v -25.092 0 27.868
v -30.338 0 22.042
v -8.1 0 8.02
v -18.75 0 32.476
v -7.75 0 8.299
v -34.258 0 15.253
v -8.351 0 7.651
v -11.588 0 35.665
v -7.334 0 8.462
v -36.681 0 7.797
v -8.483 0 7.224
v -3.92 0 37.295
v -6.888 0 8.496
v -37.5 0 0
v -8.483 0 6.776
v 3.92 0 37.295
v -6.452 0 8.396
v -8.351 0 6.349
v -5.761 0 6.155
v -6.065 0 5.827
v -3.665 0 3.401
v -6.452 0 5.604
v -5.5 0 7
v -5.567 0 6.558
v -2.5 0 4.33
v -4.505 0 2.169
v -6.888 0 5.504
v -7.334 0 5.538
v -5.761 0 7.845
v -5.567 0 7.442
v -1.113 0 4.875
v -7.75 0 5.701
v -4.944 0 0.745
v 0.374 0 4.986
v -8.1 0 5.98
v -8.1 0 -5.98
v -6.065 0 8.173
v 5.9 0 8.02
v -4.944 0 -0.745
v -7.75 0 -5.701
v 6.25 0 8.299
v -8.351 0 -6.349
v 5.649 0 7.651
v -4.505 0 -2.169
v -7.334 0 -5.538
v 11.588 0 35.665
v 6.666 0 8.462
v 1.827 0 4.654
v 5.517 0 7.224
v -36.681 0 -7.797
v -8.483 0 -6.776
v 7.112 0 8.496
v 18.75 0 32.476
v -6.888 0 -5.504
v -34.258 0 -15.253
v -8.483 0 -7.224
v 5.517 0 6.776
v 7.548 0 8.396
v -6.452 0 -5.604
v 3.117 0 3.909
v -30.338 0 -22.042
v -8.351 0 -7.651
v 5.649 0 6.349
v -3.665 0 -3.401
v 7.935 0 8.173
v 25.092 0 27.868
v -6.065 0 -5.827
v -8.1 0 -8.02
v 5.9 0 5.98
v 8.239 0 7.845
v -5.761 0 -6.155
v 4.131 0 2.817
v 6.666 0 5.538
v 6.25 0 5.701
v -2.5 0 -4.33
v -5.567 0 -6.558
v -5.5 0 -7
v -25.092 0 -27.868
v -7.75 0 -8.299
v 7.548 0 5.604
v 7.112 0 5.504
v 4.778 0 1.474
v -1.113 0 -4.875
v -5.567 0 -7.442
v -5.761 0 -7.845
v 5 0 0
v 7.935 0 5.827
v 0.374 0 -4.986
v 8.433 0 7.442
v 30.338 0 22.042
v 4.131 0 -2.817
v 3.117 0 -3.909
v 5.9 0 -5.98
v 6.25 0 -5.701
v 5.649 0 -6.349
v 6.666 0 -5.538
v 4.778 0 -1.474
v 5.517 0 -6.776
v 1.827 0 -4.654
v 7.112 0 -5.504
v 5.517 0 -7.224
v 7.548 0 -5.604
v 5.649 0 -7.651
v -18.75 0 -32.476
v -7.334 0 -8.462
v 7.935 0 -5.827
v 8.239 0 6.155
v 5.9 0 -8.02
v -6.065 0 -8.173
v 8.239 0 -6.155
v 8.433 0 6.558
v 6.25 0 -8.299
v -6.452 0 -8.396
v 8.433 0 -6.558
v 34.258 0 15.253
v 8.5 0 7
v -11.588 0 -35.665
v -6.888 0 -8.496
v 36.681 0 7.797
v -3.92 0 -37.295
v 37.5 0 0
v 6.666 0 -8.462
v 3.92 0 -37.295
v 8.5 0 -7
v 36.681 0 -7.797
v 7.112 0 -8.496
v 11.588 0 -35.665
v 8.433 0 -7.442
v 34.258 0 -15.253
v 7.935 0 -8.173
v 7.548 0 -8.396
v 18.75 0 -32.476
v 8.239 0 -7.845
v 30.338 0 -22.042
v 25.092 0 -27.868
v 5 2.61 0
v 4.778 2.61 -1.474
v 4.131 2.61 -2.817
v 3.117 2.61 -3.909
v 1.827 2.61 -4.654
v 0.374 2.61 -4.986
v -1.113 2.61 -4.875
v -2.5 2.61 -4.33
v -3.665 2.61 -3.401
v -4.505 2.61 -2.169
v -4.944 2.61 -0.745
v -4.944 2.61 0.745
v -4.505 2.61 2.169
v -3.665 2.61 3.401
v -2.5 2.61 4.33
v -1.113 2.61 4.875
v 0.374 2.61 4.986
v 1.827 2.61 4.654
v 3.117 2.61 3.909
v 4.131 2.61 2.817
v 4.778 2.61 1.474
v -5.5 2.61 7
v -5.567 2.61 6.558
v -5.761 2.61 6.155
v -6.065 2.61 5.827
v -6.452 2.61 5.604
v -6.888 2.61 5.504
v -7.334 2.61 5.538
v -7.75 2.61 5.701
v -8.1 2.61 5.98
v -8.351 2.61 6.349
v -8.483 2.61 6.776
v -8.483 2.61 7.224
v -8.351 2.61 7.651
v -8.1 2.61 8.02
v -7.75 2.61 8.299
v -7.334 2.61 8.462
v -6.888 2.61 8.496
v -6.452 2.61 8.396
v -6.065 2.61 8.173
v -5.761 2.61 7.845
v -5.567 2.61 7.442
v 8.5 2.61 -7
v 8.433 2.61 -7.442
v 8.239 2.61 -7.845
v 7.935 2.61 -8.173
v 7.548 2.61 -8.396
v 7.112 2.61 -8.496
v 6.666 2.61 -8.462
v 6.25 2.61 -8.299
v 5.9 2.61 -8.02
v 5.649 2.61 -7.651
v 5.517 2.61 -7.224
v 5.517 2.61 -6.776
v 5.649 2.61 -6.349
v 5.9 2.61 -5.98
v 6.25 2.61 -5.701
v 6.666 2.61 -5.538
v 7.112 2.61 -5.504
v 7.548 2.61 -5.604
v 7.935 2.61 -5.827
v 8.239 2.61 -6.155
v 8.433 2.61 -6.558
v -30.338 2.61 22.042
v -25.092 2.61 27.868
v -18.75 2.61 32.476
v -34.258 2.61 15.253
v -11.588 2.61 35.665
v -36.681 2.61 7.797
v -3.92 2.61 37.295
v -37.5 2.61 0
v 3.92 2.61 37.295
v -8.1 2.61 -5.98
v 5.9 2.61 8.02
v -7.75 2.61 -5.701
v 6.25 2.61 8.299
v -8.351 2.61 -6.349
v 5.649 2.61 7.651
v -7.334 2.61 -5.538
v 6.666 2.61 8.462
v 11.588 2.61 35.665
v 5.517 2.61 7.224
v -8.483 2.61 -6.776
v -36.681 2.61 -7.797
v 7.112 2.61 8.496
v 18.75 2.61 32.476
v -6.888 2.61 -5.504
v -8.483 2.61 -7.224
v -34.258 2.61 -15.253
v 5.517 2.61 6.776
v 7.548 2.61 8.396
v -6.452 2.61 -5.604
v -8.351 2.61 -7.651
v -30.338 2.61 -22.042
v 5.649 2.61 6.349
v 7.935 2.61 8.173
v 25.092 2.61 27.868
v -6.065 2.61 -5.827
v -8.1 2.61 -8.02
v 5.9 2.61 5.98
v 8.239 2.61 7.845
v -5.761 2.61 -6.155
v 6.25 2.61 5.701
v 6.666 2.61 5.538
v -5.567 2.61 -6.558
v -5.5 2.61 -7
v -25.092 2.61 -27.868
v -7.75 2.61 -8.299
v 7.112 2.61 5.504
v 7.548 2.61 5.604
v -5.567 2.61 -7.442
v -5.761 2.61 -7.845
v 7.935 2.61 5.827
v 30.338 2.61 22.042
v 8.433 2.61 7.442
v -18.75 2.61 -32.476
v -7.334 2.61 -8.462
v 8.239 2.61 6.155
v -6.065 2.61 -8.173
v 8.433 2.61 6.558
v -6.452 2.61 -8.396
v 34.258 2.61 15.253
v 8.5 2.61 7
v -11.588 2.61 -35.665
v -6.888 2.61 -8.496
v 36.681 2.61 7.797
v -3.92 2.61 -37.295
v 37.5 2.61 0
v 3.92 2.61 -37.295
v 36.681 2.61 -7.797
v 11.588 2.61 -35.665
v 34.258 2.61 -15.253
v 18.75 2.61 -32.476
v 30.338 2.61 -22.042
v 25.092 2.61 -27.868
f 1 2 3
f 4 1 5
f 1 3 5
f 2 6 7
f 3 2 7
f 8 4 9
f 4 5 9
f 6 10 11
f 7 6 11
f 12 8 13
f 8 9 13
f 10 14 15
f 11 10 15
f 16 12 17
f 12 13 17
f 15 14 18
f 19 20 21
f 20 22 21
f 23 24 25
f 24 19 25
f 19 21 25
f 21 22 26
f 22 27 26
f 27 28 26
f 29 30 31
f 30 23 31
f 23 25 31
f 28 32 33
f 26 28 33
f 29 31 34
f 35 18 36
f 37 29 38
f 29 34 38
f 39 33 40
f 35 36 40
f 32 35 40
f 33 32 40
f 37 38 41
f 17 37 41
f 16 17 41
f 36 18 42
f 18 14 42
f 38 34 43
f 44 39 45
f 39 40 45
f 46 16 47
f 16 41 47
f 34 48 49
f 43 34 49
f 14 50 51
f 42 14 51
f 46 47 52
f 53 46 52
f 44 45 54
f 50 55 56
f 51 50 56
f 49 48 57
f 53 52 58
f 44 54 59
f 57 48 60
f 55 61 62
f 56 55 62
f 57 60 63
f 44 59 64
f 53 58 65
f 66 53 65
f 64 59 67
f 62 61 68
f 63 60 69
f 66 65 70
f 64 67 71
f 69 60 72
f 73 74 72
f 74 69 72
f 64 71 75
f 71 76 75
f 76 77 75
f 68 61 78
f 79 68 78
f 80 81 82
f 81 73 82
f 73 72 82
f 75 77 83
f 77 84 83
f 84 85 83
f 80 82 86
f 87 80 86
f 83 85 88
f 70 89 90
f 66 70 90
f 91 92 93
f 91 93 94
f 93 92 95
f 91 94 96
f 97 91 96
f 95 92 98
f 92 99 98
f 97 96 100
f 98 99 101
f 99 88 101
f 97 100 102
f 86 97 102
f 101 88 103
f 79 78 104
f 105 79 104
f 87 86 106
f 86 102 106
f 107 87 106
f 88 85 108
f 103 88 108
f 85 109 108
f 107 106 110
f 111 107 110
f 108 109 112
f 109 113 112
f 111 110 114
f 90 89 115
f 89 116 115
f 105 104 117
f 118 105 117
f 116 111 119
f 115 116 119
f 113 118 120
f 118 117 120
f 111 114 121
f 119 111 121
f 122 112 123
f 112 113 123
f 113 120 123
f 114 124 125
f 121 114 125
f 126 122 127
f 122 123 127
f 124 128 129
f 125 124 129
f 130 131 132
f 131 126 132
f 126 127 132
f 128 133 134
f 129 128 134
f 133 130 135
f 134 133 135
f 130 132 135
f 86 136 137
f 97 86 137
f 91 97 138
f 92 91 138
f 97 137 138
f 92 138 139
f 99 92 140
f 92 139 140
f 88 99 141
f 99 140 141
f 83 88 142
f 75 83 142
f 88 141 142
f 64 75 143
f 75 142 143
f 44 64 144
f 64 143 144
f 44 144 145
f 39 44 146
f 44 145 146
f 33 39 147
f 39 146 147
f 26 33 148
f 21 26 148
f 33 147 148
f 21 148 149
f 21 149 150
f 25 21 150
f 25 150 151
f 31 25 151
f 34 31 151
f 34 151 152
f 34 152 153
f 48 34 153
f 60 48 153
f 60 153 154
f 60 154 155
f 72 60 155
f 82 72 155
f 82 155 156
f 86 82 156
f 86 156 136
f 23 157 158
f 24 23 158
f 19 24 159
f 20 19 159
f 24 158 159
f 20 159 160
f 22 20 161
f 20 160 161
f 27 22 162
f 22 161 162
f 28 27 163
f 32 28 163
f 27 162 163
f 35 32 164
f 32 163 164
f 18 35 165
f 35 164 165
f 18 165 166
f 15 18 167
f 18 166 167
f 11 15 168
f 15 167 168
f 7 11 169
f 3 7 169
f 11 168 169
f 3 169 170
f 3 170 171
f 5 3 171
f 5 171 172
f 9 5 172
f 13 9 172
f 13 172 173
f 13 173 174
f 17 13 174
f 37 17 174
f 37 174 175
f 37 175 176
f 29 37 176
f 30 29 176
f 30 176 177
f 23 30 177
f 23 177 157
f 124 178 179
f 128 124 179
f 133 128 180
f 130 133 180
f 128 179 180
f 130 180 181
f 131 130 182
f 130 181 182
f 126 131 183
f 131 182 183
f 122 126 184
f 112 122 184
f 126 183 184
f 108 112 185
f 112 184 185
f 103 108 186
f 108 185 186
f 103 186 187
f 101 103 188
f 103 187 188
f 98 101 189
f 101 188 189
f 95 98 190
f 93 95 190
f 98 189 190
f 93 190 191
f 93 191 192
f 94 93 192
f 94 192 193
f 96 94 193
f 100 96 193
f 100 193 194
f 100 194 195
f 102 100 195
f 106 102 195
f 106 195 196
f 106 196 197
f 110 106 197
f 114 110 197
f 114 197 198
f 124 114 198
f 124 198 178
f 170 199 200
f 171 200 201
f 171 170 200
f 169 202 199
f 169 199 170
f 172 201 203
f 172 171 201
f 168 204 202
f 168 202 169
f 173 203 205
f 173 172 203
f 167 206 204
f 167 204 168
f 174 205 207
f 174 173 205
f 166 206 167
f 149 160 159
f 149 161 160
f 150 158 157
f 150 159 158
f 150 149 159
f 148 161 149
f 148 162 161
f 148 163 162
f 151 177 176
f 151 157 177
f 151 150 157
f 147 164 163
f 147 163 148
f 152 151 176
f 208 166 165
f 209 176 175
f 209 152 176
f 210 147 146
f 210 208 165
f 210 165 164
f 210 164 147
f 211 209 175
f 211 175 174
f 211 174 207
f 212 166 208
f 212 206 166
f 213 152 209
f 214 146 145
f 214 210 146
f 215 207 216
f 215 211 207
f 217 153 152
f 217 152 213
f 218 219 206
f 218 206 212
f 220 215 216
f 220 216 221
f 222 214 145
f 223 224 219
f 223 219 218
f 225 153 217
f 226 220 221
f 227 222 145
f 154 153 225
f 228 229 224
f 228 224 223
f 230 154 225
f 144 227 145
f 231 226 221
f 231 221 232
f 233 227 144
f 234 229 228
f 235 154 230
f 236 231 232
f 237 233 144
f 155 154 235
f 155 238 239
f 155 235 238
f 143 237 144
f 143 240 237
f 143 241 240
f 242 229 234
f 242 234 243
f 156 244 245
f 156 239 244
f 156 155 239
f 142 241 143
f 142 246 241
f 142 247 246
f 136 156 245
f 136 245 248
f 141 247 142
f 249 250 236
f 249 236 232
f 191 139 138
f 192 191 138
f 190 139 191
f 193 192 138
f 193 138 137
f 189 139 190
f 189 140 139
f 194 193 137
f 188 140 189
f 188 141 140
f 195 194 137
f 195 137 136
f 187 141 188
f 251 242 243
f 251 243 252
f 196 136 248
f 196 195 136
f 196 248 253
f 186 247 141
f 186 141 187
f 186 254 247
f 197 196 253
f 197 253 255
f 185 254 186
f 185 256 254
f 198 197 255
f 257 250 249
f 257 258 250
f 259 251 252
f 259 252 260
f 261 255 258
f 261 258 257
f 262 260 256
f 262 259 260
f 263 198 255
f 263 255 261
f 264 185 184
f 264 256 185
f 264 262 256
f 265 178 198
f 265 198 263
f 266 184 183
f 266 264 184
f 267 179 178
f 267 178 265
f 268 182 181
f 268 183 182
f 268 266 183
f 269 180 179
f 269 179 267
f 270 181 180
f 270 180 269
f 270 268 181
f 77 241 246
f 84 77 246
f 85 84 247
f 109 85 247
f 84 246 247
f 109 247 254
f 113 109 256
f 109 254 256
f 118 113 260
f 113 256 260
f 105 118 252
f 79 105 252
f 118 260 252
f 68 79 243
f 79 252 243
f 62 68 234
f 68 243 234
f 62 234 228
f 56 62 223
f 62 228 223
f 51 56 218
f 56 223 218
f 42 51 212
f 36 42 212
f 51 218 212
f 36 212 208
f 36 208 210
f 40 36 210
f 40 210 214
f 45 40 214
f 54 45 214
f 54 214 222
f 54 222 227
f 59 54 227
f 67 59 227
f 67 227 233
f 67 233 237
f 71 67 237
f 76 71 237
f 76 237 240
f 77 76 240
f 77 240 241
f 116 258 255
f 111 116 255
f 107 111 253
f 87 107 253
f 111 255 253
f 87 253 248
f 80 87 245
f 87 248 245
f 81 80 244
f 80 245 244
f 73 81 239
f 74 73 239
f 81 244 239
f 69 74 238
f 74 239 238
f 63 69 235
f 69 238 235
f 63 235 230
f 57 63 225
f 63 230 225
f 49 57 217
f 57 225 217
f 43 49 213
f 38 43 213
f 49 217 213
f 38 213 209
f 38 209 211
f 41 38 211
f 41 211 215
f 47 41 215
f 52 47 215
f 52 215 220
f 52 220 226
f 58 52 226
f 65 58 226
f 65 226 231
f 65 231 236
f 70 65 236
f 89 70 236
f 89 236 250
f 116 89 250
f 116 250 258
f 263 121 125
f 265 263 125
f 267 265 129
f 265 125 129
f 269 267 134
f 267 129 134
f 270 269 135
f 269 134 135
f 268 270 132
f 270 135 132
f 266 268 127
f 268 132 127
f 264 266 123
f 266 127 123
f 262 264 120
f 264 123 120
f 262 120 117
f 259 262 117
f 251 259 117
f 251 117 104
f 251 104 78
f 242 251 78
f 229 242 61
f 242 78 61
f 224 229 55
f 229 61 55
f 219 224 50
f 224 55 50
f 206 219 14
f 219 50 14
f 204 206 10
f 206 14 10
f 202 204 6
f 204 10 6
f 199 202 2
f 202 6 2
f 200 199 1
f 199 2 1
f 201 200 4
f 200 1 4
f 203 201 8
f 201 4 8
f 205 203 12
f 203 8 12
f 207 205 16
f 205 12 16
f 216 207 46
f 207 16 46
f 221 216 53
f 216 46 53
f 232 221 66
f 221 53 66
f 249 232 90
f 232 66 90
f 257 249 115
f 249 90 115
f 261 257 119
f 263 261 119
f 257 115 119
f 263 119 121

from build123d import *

# Parameters (mm, degrees)
SKETCH1_R           = 37.5
BOSS_EXTRUDE1_DEPTH = 2.61
SKETCH2_R           = 5
CUT_EXTRUDE1_DEPTH  = 13.05
SKETCH3_R           = 1.5
CUT_EXTRUDE2_DEPTH  = 3.61


with BuildPart() as part:
    # Sketch1 → Boss-Extrude1 (new body)
    with BuildSketch(Plane(origin=(0, 0, 0), x_dir=(1, 0, 0), z_dir=(0, 1, 0))):
        Circle(SKETCH1_R)
    extrude(amount=BOSS_EXTRUDE1_DEPTH)

    # Sketch2 → Cut-Extrude1 (cut)
    with BuildSketch(Plane(origin=(0, 2.61, 0), x_dir=(1, 0, 0), z_dir=(0, 1, 0))):
        Circle(SKETCH2_R)
    extrude(amount=-CUT_EXTRUDE1_DEPTH, mode=Mode.SUBTRACT)

    # Sketch3 → Cut-Extrude2 (cut, through all)
    with BuildSketch(Plane(origin=(0, 2.61, 0), x_dir=(1, 0, 0), z_dir=(0, 1, 0))):
        with Locations((-7, 7)):
            Circle(SKETCH3_R)
        with Locations((7, 7)):
            Circle(SKETCH3_R)
        with Locations((7, -7)):
            Circle(SKETCH3_R)
        with Locations((-7, -7)):
            Circle(SKETCH3_R)
    extrude(amount=-CUT_EXTRUDE2_DEPTH, mode=Mode.SUBTRACT)


solid = part.part
